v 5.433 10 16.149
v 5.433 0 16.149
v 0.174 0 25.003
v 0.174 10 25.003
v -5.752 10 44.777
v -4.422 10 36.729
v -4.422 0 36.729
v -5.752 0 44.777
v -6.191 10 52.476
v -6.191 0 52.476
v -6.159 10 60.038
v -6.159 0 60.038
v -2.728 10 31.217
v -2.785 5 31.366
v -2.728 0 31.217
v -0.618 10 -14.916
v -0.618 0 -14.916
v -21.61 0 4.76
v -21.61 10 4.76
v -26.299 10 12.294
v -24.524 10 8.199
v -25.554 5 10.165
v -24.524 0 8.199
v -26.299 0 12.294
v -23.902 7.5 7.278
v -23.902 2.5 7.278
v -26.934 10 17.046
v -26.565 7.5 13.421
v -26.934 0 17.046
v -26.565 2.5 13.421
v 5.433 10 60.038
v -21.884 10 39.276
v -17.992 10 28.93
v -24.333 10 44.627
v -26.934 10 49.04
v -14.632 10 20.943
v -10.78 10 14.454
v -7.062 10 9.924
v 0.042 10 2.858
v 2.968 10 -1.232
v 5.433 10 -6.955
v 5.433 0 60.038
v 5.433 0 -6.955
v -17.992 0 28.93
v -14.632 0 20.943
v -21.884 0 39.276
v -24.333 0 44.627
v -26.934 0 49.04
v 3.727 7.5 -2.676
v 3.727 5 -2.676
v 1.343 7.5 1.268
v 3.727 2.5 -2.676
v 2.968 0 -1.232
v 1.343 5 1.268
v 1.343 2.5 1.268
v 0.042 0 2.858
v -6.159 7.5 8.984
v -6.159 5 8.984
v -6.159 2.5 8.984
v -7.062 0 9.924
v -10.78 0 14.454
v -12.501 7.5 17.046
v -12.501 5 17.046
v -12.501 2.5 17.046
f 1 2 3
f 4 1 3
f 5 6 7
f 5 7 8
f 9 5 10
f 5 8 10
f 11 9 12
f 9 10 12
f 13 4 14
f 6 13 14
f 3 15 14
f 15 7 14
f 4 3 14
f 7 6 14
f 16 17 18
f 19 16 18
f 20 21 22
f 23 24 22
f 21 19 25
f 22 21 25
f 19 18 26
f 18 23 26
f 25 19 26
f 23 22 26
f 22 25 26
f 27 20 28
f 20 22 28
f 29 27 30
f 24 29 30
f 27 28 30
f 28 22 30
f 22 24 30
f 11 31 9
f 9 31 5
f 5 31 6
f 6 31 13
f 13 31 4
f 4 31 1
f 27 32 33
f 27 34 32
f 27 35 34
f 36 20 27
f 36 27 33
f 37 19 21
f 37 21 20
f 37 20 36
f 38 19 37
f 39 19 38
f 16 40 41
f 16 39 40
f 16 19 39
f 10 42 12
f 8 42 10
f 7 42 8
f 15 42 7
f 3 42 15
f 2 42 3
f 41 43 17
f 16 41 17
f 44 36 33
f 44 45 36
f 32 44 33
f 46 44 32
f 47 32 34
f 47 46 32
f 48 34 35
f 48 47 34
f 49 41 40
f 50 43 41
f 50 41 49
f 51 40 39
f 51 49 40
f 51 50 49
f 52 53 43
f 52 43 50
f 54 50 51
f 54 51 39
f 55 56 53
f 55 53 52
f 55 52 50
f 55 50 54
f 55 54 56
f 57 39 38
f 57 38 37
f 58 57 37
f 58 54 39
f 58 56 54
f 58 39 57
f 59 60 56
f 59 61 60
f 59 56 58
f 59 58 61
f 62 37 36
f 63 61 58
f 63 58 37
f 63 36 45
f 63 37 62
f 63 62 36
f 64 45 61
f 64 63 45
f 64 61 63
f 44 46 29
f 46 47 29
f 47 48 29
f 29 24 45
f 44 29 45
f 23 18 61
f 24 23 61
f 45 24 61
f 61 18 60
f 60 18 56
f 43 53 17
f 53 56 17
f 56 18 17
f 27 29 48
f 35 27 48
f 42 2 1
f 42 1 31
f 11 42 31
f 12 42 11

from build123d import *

# Parameters (mm, degrees)
BOSS_EXTRUDE1_DEPTH   = 10
BOSS_EXTRUDE1_2_DEPTH = 10


with BuildPart() as part:
    # Sketch1 → Boss-Extrude1 (new body)
    with BuildSketch(Plane(origin=(0, 0, 0), x_dir=(1, 0, 0), z_dir=(0, 1, 0))):
        with BuildLine():
            Line((5.433476937, -16.148700246), (5.433476937, -40.48083774))
            Line((5.433476937, -40.48083774), (5.433476937, -60.038229021))
            Line((5.433476937, -60.038229021), (-6.1594063, -60.038229021))
            add(Edge.make_bspline(
                [(5.433476937, -16.148700246), (2.448089637, -21.031180775), (-6.099224191, -34.262909027), (-6.363193197, -50.657943667), (-6.1594063, -60.038229021)],
                knots=[0, 0, 0, 0, 0.373828803, 1, 1, 1, 1], degree=3))
        make_face()
    extrude(amount=BOSS_EXTRUDE1_DEPTH)


with BuildPart() as body_2:
    # Sketch1 → Boss-Extrude1 2 (new body)
    with BuildSketch(Plane(origin=(0, 0, 0), x_dir=(1, 0, 0), z_dir=(0, 1, 0))):
        with BuildLine():
            Line((5.433476937, 6.95456054), (-0.618053814, 14.915651895))
            Line((-0.618053814, 14.915651895), (-21.609622, -4.759713708))
            add(Edge.make_bspline(
                [(-21.609622, -4.759713708), (-26.835982818, -9.42662947), (-26.934428436, -17.04557435)],
                knots=[0, 0, 0, 1, 1, 1], degree=2))
            Line((-26.934428436, -17.04557435), (-26.934428436, -49.040359802))
            add(Edge.make_bspline(
                [(5.433476937, 6.95456054), (4.504660032, 4.056786226), (1.623432731, -2.173396893), (-6.320224408, -8.592135406), (-18.078432993, -23.409919855), (-20.338944488, -39.267059515), (-26.934428436, -49.040359802)],
                knots=[0, 0, 0, 0, 0.140998177, 0.305677036, 0.462618672, 1, 1, 1, 1], degree=3))
        make_face()
    extrude(amount=BOSS_EXTRUDE1_2_DEPTH)


solid = Compound([part.part, body_2.part])
